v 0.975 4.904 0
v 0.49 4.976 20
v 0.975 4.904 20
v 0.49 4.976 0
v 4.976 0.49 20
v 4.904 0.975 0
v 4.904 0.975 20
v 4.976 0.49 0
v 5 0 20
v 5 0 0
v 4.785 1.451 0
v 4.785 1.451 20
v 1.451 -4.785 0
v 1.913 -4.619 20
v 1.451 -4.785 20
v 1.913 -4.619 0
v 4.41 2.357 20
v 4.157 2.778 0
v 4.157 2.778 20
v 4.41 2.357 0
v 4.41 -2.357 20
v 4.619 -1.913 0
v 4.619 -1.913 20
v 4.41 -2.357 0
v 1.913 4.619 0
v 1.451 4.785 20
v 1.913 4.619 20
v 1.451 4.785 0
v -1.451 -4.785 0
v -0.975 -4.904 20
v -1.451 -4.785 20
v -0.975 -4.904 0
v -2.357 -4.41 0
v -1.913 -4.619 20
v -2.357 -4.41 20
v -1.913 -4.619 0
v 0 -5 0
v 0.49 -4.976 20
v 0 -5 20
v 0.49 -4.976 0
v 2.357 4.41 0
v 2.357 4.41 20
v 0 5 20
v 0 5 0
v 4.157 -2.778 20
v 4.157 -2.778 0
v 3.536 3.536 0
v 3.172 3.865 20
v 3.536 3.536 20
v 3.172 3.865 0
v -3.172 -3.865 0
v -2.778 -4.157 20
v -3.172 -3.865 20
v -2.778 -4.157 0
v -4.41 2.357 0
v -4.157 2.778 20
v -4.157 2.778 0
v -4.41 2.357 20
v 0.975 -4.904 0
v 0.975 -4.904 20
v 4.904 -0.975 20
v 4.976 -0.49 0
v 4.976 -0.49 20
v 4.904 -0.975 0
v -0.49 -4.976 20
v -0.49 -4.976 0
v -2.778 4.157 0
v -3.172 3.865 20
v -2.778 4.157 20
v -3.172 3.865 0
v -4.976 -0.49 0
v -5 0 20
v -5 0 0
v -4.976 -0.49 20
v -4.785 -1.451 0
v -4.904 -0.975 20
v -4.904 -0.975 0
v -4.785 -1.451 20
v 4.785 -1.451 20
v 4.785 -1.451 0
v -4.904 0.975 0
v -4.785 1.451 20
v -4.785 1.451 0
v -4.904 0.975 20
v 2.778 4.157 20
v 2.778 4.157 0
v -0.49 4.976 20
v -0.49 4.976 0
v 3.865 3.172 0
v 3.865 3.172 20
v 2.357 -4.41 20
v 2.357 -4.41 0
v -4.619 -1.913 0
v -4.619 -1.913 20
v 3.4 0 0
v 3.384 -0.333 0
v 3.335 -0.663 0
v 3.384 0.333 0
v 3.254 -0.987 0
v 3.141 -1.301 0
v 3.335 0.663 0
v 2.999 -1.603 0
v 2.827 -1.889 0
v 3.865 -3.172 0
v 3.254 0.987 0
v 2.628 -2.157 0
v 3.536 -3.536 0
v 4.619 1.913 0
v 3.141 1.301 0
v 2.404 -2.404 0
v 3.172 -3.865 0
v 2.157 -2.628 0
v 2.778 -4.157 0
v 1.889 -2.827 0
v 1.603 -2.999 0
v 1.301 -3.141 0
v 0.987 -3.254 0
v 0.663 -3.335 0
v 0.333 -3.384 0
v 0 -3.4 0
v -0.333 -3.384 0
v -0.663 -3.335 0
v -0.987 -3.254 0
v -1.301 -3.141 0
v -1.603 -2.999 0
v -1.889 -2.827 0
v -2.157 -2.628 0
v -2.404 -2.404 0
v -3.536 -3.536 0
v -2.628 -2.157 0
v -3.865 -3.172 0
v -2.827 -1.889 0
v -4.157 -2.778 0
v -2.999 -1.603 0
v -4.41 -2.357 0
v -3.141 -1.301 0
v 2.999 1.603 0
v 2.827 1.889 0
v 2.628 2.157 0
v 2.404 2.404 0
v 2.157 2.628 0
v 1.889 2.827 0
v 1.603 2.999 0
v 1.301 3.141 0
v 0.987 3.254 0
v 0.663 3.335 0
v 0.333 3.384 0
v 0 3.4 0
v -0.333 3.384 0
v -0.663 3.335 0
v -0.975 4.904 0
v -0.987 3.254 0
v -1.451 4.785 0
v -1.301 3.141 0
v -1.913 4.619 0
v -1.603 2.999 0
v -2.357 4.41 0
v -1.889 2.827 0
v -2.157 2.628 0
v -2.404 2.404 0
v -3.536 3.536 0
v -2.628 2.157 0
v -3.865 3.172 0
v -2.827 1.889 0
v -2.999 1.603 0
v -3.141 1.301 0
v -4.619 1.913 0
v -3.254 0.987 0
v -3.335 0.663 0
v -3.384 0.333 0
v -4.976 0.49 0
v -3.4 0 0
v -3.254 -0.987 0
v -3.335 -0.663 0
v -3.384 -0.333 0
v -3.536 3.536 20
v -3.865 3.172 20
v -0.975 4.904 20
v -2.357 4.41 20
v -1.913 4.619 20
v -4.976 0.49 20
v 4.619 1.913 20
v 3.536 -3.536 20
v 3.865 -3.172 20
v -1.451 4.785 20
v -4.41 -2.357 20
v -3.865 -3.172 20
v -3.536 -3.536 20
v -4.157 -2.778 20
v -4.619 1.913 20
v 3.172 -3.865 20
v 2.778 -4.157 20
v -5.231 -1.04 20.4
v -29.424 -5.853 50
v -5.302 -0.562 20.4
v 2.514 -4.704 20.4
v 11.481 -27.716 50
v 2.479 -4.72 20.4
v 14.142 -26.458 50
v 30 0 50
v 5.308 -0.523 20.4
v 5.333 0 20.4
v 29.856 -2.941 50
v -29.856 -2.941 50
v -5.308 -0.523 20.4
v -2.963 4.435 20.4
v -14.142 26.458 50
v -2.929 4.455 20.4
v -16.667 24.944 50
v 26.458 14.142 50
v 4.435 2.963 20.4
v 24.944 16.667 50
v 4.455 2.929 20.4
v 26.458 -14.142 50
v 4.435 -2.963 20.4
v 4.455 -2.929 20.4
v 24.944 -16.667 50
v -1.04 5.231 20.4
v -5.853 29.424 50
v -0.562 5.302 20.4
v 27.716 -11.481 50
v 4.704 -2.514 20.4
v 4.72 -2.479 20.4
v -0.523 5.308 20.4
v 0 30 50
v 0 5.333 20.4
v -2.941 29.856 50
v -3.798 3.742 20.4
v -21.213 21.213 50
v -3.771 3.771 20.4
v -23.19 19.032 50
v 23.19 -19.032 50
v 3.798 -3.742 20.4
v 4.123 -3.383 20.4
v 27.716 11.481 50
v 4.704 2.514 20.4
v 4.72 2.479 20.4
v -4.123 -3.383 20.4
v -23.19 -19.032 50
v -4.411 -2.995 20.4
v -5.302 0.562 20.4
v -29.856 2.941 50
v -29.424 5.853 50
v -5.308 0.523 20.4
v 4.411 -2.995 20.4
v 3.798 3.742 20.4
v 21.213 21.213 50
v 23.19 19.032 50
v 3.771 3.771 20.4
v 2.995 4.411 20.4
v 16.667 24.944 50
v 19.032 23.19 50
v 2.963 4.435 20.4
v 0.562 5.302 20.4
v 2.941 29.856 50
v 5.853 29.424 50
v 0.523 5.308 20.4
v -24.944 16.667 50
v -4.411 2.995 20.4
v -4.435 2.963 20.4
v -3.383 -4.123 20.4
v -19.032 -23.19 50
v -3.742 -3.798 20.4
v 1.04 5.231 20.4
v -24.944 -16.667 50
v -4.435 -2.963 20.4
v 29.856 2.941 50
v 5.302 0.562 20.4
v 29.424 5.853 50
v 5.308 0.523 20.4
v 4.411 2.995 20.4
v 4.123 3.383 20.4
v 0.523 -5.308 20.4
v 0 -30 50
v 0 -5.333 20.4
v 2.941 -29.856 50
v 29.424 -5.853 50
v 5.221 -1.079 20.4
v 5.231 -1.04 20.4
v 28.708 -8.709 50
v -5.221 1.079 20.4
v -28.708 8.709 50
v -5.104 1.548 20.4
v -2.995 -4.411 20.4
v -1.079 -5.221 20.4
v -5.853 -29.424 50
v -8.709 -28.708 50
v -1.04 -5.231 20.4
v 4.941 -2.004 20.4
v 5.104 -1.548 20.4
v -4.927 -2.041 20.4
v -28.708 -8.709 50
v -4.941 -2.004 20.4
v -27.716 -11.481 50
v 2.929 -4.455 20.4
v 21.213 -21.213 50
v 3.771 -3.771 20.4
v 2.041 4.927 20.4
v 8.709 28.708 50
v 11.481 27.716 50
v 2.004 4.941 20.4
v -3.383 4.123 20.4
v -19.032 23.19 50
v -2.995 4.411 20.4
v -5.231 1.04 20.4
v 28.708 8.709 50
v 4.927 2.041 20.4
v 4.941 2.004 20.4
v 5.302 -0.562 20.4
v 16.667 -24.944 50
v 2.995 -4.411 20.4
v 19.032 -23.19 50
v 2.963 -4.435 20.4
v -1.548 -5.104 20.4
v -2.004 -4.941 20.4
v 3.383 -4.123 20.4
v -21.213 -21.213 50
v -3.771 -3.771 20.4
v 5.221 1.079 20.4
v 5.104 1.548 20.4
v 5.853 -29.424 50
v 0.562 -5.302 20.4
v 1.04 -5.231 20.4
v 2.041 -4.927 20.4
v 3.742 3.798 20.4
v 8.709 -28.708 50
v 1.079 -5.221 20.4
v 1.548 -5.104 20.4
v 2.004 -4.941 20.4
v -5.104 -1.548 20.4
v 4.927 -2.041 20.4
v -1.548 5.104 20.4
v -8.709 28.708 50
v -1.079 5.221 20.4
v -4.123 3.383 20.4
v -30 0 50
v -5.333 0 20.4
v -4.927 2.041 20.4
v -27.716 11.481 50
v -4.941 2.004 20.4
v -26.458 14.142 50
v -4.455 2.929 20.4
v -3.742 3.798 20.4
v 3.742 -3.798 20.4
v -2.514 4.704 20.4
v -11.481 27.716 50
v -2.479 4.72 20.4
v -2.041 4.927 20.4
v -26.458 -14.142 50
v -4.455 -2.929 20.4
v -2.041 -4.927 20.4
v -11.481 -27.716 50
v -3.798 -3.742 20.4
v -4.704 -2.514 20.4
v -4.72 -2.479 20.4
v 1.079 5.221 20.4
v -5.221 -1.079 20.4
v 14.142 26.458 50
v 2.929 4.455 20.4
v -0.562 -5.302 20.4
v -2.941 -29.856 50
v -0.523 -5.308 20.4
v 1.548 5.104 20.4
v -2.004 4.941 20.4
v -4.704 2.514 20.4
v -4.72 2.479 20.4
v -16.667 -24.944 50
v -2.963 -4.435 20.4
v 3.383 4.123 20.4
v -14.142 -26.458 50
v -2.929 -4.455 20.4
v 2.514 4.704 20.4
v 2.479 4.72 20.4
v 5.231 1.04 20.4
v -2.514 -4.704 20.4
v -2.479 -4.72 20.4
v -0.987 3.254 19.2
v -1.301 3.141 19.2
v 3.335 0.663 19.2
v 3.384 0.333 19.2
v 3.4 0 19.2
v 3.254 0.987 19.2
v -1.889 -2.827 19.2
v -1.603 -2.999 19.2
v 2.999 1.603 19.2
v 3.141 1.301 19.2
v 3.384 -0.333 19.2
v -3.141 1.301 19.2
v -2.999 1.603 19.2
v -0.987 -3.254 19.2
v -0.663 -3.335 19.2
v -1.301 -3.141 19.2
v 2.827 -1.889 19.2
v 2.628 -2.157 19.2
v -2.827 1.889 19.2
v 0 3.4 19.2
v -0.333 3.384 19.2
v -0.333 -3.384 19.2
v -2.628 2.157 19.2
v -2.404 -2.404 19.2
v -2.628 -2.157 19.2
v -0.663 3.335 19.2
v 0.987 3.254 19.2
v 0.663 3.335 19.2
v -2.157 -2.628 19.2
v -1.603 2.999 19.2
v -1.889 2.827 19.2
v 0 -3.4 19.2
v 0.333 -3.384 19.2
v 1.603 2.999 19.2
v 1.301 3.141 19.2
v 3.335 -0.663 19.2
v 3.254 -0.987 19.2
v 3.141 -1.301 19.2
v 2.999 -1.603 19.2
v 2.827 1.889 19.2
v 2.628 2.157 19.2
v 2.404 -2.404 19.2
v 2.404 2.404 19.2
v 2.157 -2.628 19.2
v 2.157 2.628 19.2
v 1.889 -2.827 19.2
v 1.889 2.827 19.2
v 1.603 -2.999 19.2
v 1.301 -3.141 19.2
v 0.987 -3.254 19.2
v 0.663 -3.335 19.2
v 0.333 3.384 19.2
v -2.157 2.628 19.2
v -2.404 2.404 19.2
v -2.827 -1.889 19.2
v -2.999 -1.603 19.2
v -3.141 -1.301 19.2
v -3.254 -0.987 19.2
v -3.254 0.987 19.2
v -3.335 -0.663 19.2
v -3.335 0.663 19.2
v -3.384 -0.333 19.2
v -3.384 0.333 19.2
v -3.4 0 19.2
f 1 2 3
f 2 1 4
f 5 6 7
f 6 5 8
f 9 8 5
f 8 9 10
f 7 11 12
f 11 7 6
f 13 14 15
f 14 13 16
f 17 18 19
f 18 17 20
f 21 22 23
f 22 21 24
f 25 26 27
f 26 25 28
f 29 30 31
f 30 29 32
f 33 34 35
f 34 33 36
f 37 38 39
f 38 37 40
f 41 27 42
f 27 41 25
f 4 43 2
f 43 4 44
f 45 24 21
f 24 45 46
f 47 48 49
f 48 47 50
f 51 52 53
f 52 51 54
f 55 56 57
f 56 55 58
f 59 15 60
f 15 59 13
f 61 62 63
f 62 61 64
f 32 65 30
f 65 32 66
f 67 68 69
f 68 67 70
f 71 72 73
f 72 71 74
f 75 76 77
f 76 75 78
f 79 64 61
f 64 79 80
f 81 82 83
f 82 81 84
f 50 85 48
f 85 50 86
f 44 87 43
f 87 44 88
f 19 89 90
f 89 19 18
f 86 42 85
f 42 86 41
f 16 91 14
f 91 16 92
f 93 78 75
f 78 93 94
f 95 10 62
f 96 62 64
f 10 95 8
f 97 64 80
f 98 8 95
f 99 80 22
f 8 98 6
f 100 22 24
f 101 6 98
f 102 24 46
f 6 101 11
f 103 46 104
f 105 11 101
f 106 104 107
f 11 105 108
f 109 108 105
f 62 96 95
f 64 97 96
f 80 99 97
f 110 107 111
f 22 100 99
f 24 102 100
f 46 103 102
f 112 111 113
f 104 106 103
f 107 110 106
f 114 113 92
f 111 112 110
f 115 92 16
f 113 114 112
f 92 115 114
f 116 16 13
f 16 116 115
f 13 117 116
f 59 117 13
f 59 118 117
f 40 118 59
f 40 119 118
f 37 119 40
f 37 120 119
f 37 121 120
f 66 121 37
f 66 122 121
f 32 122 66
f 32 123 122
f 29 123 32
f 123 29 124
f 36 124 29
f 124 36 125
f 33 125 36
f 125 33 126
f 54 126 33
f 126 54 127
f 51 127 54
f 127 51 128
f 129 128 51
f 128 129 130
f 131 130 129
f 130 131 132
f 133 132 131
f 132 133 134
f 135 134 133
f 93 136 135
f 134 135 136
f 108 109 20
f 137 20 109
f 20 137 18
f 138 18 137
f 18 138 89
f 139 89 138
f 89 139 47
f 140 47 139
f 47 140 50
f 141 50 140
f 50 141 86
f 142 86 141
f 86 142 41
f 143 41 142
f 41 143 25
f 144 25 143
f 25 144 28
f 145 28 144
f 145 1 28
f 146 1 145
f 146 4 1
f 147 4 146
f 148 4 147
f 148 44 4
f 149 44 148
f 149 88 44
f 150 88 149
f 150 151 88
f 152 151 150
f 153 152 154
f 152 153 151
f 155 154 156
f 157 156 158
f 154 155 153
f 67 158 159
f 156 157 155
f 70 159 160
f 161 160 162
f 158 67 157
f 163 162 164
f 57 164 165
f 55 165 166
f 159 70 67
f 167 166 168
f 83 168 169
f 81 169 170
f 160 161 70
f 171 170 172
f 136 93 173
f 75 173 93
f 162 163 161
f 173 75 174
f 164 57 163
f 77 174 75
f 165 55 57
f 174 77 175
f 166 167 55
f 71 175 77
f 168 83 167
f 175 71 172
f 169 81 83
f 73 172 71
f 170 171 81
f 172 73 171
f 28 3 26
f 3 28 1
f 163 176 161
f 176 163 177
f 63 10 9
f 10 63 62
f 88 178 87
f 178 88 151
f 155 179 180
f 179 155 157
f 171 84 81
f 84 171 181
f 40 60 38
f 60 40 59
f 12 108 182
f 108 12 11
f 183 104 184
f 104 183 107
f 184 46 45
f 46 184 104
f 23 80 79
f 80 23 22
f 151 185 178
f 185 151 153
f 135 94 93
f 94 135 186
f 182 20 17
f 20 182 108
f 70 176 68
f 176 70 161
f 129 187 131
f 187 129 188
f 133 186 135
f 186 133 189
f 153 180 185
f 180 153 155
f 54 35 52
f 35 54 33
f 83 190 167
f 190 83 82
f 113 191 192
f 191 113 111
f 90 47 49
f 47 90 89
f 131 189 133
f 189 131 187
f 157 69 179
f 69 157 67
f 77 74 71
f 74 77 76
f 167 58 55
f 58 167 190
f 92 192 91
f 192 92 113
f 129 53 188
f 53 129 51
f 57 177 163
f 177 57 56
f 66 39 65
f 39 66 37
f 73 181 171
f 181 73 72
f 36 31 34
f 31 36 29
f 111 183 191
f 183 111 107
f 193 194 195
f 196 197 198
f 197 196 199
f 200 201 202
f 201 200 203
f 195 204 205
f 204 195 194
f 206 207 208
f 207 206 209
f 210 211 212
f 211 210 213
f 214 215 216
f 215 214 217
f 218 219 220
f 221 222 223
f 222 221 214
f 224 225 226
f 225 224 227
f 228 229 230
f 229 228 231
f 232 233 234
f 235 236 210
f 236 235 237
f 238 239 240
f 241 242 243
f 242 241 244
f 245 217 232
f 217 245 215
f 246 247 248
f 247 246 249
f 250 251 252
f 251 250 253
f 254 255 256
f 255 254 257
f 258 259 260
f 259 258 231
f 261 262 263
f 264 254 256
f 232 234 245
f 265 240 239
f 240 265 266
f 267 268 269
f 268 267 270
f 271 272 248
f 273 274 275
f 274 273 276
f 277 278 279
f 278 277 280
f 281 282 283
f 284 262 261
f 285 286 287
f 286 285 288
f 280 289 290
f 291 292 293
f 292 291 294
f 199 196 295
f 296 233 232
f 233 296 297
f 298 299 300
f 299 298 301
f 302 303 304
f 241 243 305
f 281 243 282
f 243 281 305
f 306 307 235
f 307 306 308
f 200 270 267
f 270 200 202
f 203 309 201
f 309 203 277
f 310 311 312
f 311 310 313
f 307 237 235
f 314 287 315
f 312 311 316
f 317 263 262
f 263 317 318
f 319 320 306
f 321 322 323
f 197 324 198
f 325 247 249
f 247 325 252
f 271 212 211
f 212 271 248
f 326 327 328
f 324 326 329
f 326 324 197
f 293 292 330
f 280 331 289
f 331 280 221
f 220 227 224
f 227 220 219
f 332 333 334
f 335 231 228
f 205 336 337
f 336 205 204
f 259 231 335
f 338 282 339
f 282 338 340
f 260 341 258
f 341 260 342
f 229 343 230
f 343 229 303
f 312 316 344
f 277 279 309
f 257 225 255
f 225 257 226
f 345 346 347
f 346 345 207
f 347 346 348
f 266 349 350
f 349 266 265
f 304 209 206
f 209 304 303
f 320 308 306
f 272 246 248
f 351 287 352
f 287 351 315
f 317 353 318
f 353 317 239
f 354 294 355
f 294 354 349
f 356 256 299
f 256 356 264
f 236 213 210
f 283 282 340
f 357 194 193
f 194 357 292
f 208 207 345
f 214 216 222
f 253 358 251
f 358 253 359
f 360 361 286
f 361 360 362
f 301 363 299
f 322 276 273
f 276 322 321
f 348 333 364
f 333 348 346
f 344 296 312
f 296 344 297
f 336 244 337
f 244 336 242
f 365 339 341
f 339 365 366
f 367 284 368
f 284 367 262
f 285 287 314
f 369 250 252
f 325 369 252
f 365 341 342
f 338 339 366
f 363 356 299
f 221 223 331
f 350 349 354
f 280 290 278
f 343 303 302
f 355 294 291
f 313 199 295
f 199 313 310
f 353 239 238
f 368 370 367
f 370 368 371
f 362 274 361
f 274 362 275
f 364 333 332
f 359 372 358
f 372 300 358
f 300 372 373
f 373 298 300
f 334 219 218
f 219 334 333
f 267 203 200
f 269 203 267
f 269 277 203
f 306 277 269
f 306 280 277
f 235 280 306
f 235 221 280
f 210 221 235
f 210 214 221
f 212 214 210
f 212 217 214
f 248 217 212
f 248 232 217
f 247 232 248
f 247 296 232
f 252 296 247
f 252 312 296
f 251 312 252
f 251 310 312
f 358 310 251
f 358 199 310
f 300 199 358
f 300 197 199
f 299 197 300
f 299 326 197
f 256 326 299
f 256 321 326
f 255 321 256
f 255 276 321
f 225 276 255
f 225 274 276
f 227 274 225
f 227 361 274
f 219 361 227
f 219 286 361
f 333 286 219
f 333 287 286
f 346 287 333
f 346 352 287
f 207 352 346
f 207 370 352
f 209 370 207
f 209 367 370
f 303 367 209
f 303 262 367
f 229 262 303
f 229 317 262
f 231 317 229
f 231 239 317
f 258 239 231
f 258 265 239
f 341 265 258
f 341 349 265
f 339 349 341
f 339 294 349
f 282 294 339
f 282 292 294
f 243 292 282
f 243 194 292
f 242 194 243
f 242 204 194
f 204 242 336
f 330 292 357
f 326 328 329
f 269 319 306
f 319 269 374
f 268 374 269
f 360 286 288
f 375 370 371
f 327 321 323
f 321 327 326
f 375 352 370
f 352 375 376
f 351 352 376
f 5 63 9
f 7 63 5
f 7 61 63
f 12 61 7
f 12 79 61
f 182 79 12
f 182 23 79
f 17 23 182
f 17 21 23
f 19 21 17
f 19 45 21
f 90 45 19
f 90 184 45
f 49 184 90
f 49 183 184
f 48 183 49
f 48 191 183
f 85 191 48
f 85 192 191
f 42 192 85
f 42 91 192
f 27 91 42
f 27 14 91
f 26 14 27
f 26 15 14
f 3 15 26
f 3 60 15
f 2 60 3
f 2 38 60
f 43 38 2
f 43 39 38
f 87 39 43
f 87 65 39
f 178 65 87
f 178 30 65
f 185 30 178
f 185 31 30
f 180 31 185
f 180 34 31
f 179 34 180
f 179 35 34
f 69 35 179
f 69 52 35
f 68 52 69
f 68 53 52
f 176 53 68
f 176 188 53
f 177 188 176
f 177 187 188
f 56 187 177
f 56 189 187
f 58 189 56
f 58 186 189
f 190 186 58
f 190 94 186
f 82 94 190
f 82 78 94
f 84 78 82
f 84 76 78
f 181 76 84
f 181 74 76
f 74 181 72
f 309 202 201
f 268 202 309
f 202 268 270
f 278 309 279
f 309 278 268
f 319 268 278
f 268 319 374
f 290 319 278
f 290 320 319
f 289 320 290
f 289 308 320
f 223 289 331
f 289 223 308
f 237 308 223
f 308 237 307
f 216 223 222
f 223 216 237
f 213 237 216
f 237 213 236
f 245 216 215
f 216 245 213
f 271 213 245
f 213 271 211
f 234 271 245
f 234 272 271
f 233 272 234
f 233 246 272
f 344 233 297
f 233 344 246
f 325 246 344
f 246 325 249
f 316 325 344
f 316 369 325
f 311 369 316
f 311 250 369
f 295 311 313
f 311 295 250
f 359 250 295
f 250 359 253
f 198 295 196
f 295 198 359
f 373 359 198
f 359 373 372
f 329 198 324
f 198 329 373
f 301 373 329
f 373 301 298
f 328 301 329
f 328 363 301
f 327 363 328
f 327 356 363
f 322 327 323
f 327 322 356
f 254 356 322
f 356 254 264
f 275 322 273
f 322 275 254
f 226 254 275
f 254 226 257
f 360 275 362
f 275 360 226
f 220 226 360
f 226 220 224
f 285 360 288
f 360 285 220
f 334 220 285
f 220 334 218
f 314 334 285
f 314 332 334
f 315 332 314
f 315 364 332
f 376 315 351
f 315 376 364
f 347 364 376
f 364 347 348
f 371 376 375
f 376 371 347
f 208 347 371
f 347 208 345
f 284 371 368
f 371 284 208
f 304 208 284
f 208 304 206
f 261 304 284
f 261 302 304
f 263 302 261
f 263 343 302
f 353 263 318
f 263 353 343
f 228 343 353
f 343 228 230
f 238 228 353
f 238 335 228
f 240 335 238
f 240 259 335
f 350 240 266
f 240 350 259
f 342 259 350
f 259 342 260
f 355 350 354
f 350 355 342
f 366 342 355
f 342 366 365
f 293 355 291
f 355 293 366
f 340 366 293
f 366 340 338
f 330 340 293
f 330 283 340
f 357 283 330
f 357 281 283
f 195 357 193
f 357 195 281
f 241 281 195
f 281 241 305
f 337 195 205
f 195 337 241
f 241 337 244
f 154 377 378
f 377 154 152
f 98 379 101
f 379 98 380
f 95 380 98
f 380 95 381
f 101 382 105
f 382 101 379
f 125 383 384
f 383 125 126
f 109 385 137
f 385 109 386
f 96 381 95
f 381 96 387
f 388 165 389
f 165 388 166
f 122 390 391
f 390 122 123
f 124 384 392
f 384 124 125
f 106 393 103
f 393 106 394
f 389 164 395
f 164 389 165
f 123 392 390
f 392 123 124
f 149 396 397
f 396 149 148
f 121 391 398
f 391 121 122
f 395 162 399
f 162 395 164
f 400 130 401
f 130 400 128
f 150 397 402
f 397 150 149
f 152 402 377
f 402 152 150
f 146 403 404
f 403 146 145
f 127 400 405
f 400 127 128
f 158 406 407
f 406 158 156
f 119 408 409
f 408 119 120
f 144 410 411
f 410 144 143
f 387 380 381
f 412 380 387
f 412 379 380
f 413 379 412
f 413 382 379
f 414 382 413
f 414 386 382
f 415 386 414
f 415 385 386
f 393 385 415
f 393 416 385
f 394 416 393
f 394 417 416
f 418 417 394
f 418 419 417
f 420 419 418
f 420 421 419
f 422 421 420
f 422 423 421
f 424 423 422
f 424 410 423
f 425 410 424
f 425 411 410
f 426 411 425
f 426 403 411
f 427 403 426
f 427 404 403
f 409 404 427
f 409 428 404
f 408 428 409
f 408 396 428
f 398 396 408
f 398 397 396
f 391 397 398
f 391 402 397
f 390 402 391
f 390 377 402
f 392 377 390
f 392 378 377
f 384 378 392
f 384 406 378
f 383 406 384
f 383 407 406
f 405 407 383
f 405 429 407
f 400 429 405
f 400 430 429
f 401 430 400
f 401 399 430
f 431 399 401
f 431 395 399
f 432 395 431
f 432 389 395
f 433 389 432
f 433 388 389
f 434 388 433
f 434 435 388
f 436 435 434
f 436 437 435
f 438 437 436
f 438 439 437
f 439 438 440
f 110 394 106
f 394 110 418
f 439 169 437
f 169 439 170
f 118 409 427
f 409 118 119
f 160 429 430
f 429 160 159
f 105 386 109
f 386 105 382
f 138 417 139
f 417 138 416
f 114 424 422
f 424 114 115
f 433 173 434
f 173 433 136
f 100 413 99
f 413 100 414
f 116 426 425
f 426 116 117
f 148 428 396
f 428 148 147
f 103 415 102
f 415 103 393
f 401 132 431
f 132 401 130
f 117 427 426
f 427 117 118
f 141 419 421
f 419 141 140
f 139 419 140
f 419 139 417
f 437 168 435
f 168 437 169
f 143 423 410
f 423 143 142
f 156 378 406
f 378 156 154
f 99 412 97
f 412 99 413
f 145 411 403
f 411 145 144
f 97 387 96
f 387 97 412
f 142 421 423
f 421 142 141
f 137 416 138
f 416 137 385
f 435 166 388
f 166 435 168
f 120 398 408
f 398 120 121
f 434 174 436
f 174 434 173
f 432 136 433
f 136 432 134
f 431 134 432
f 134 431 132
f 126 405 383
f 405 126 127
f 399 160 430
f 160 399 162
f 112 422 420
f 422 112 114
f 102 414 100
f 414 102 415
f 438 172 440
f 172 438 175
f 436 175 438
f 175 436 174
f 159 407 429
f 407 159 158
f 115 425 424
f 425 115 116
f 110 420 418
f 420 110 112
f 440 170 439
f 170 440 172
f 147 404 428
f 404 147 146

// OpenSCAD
// Lab funnel - printed upright, open at top and bottom
// Units: mm

$fn = 64;

// --- Dimensions ---
spout_od      = 10;   // spout outer diameter
spout_id      = spout_od - 2 * 1.6;  // spout bore (6.8)
spout_h       = 20;   // spout height (z = 0 to 20)
cone_top_d    = 10;   // cone diameter at z = 20
cone_rim_d    = 60;   // cone rim diameter at z = 50
cone_h        = 30;   // cone height (z = 20 to 50)
wall          = 1.6;  // wall thickness

total_h = spout_h + cone_h;  // 50

difference() {
    union() {
        // Spout
        cylinder(d = spout_od, h = spout_h);
        // Cone (from top diameter down to rim)
        translate([0, 0, spout_h])
            cylinder(d1 = cone_top_d, d2 = cone_rim_d, h = cone_h);
    }
    // Through-bore: spout bore up to cone start, then 60 mm hole at rim
    translate([0, 0, spout_h])
        cylinder(d = cone_rim_d + 0.8, h = 0.4);  // thin wall above rim
    cylinder(d = spout_id, h = spout_h - 0.8);   // bore ends below cone
}
